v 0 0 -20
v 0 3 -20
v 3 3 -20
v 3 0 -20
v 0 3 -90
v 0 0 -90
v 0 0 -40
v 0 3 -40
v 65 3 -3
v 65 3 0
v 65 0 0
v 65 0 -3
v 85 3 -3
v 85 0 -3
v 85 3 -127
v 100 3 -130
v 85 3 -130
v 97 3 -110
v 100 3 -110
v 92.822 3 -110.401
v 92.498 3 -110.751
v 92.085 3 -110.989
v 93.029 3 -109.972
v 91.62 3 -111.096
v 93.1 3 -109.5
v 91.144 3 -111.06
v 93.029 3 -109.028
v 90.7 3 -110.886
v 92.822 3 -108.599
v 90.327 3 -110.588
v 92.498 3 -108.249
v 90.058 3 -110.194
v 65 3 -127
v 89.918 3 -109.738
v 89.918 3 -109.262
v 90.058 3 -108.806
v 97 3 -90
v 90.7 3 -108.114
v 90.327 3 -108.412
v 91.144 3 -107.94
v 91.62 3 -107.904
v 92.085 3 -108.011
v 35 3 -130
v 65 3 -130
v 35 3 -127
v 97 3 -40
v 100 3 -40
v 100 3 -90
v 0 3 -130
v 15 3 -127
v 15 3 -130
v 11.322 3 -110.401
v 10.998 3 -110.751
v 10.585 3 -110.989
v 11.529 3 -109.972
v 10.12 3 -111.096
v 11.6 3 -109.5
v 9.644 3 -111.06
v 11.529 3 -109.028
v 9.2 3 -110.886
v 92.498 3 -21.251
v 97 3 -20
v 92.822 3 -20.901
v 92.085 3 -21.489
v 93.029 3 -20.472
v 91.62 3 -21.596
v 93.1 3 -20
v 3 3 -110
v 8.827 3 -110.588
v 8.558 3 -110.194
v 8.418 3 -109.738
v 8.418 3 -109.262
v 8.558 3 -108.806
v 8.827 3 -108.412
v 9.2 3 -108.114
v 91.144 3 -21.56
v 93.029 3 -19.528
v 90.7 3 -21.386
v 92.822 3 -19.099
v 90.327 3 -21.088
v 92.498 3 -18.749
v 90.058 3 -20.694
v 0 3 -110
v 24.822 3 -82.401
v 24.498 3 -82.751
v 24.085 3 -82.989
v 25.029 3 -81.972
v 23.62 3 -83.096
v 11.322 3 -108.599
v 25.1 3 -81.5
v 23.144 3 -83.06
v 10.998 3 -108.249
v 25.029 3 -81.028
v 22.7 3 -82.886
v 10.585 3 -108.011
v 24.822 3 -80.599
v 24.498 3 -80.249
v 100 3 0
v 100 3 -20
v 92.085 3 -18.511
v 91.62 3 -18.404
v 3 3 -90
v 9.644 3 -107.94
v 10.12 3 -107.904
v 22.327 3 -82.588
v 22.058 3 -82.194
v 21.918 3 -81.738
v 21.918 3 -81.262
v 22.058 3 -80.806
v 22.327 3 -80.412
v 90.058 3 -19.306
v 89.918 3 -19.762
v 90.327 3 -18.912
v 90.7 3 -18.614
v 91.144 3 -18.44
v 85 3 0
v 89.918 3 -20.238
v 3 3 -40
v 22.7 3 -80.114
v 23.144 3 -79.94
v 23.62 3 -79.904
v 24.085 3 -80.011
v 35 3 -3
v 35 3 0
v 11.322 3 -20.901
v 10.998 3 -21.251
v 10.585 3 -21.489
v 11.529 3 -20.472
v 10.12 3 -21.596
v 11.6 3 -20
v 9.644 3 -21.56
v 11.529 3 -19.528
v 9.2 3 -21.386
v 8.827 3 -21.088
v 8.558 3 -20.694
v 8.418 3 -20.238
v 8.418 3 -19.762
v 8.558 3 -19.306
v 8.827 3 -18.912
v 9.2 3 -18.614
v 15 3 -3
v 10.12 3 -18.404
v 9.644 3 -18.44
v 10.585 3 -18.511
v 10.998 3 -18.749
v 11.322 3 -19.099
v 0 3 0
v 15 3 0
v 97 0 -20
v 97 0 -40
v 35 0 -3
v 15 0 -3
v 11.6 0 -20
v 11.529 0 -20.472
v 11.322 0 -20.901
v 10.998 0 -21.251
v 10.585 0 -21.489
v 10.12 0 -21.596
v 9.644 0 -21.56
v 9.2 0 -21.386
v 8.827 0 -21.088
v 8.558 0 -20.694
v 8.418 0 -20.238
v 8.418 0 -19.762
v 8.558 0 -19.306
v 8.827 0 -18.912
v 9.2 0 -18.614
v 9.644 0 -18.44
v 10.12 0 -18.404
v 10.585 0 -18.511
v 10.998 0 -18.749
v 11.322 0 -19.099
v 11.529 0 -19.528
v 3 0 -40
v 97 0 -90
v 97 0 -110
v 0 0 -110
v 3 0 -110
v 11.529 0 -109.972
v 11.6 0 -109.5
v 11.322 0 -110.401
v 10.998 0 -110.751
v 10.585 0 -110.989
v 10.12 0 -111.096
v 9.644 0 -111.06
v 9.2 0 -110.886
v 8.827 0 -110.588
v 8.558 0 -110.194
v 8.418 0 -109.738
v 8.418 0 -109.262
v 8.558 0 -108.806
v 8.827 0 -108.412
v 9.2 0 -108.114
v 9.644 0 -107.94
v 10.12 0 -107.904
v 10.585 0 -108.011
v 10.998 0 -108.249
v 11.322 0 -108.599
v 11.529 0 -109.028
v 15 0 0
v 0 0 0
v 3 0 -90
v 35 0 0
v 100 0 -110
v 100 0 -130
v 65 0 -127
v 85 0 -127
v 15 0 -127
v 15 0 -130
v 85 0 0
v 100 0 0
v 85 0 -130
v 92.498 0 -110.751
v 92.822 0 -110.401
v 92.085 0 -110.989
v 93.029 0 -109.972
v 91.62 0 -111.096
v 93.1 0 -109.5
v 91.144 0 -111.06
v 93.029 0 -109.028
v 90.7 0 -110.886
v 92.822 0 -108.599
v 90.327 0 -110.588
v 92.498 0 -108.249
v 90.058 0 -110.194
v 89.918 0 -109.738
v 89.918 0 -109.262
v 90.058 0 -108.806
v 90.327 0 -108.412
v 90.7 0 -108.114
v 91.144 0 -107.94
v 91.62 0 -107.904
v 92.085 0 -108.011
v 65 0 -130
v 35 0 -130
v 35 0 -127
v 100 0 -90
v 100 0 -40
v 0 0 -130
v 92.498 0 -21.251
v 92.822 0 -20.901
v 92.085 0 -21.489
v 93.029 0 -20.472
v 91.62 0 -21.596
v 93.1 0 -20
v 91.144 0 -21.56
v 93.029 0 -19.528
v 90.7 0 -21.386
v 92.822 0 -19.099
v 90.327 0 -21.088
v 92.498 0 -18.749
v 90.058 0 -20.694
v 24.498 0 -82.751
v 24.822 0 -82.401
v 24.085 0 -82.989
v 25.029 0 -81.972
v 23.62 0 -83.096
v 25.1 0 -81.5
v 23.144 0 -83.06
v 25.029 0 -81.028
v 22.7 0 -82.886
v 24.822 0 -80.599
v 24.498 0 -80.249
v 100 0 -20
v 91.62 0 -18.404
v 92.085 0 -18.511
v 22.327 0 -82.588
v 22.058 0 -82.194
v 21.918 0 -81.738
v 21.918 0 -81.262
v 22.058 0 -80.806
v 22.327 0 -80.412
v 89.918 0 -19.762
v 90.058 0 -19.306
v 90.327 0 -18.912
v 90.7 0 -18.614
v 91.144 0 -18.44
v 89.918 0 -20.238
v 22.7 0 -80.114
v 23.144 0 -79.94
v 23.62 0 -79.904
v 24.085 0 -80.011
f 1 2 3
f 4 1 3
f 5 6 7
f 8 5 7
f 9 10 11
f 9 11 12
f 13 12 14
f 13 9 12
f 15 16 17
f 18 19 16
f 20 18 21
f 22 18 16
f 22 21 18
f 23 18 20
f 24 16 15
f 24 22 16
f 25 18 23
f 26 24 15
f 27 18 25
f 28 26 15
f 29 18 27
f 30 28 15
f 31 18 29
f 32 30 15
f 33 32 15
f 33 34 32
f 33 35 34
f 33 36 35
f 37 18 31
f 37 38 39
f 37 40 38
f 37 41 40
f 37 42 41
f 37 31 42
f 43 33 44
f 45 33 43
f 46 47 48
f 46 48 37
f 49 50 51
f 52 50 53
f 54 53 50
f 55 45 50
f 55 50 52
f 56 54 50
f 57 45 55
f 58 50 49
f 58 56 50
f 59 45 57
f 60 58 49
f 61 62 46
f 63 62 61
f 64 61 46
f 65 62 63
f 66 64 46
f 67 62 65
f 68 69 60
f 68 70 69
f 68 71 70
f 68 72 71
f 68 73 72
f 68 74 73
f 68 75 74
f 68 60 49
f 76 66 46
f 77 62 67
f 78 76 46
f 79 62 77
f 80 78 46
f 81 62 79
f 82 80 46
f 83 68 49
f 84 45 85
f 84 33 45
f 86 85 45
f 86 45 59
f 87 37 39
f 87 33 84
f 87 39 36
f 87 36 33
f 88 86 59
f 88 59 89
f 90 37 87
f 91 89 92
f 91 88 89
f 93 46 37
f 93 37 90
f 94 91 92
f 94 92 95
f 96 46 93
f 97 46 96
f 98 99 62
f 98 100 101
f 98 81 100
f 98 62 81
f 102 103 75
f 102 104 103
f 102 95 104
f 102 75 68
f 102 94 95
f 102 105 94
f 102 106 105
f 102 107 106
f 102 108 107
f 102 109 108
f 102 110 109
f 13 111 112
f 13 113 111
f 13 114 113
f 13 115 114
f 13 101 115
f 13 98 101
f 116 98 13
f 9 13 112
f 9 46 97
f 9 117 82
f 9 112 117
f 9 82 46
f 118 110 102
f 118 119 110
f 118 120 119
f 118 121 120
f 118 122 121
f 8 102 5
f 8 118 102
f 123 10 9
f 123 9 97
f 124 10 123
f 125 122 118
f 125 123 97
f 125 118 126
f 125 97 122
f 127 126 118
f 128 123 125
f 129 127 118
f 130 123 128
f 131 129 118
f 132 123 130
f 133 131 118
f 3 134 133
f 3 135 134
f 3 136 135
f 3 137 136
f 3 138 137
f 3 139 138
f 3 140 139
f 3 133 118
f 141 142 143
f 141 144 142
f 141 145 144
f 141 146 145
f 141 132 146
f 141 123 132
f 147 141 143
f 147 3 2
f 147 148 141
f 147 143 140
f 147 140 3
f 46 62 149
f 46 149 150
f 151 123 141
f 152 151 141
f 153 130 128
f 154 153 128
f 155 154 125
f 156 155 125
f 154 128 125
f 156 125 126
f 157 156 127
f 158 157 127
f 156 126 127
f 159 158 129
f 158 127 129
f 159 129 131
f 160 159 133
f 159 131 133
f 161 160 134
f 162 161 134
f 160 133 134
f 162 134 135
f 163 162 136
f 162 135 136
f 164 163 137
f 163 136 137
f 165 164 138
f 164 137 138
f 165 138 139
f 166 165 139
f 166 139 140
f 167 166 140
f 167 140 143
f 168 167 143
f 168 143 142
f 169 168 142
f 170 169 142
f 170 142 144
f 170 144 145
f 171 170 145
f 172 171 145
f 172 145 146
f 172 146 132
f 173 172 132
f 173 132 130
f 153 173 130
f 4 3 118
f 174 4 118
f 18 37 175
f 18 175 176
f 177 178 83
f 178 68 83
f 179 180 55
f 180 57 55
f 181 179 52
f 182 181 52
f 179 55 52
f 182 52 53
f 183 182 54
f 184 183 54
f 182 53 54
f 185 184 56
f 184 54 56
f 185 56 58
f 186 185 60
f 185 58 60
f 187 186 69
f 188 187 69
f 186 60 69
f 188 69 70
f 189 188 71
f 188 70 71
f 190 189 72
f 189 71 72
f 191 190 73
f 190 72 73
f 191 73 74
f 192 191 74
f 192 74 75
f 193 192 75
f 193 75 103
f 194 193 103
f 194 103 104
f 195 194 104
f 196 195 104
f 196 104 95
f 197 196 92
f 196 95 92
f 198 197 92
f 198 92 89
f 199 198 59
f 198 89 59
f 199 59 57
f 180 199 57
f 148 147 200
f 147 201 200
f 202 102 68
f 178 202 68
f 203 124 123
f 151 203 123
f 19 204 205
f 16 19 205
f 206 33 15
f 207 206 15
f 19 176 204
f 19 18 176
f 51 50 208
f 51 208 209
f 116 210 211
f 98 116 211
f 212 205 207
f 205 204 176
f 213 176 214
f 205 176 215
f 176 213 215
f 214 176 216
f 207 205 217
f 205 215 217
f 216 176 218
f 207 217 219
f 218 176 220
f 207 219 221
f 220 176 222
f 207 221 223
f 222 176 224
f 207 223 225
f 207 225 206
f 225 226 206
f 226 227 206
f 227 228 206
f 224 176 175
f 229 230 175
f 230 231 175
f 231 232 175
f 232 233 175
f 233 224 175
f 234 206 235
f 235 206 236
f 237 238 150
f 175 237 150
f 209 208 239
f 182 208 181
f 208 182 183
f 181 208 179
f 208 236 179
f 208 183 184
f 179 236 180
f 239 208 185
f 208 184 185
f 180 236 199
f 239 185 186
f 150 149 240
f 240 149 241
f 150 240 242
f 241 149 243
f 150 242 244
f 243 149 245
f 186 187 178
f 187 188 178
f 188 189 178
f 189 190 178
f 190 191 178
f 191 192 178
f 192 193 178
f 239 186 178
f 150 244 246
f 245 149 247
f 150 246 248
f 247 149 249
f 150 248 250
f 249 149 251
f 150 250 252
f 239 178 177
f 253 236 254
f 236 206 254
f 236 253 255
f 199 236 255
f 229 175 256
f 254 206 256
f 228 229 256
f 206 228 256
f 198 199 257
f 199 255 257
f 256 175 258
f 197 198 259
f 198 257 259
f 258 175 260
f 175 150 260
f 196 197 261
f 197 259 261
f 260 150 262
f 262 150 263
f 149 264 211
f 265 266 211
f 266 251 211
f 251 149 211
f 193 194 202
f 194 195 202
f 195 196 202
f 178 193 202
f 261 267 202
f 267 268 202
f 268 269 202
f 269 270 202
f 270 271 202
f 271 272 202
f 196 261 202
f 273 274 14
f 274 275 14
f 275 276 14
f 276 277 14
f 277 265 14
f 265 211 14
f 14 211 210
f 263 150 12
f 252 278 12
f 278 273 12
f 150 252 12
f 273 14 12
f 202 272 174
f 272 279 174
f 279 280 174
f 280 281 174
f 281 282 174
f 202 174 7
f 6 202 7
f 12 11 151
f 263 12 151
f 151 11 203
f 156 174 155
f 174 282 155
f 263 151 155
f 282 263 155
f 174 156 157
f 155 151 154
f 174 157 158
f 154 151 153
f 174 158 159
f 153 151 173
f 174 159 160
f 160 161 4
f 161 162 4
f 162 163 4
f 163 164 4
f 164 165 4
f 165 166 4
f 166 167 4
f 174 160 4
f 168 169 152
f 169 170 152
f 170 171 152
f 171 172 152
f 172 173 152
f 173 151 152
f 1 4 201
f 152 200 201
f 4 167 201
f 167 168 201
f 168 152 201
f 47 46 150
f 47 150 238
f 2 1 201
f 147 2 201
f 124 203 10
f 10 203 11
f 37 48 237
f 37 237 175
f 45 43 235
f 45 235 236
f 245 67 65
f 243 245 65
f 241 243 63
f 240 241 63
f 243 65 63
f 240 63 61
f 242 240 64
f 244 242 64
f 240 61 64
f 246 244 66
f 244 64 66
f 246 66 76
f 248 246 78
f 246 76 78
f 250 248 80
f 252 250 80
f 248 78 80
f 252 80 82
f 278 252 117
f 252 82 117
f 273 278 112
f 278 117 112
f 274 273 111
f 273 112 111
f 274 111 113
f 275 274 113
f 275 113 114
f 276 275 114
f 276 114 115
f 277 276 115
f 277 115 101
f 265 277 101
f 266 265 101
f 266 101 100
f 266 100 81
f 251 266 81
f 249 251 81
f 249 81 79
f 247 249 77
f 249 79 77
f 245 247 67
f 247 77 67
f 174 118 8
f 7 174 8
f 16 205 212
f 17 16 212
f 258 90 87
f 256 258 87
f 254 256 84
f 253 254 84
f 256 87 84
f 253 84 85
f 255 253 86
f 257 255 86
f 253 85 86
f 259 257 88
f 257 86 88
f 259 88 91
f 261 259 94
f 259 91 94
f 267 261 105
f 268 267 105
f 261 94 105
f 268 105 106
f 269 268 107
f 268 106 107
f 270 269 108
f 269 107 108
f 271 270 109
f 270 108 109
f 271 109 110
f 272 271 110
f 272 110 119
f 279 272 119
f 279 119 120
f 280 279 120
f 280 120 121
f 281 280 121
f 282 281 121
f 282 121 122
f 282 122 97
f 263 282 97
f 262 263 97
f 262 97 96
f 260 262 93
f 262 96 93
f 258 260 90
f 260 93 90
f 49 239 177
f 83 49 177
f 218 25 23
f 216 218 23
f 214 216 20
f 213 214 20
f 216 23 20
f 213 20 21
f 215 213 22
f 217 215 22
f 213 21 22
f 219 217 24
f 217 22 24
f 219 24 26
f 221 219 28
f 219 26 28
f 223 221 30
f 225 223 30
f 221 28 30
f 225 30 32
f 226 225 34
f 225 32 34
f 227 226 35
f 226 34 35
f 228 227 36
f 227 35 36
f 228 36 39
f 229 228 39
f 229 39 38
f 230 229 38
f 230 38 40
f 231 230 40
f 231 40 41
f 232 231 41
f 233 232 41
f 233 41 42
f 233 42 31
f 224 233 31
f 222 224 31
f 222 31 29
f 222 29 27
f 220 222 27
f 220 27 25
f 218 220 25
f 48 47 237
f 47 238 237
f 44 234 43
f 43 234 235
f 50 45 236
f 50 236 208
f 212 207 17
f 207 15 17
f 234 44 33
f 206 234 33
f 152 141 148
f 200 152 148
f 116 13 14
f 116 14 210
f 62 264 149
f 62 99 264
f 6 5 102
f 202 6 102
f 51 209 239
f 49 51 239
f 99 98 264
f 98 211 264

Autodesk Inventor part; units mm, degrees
ref_plane "YZ Plane" through (0, 0, 0) normal (1, 0, 0) x (0, 1, 0)
ref_plane "XZ Plane" through (0, 0, 0) normal (0, 1, 0) x (-1, 0, 0)
ref_plane "XY Plane" through (0, 0, 0) normal (0, 0, 1) x (1, 0, 0)
sketch "Sketch1" plane through (0, 0, 0) normal (0, 1, 0) x (-1, 0, 0)
  line L0 (0, 0) -> (-100, 0)
  line L1 (-100, 0) -> (-100, -130)
  line L2 (-100, -130) -> (0, -130)
  line L3 (0, -130) -> (0, 0)
  dimension "Length" = 130
  dimension "Width" = 100
extrude "Baseplate" add sketch "Sketch1" along normal blind 3
sketch "TabsSketch" plane through (0, 3, 0) normal (0, 1, 0) x (1, 0, 0)
  line L0 (0, 130) -> (0, 0) projected
  line L1 (0, 20) -> (3, 20)
  line L2 (3, 20) -> (3, 40)
  line L3 (3, 40) -> (0, 40)
  line L4 (0, 40) -> (0, 20)
  line L5 (0, 90) -> (3, 90)
  line L6 (3, 90) -> (3, 110)
  line L7 (3, 110) -> (0, 110)
  line L8 (0, 110) -> (0, 90)
  line L9 (0, 0) -> (100, 0) projected
  line L10 (100, 130) -> (0, 130) projected
  line L11 (50, 0) -> (50, 130) construction
  line L12 (15, 0) -> (35, 0)
  line L13 (35, 0) -> (35, 3)
  line L14 (35, 3) -> (15, 3)
  line L15 (15, 3) -> (15, 0)
  line L16 (15, 130) -> (35, 130)
  line L17 (35, 130) -> (35, 127)
  line L18 (35, 127) -> (15, 127)
  line L19 (15, 127) -> (15, 130)
  line L20 (100, 130) -> (100, 0)
  line L21 (100, 20) -> (97, 20)
  line L22 (97, 20) -> (97, 40)
  line L23 (97, 40) -> (100, 40)
  line L24 (100, 40) -> (100, 20)
  line L25 (100, 90) -> (97, 90)
  line L26 (97, 90) -> (97, 110)
  line L27 (97, 110) -> (100, 110)
  line L28 (100, 110) -> (100, 90)
  line L29 (100, 0) -> (0, 0)
  line L30 (0, 130) -> (100, 130)
  line L31 (85, 0) -> (65, 0)
  line L32 (65, 0) -> (65, 3)
  line L33 (65, 3) -> (85, 3)
  line L34 (85, 3) -> (85, 0)
  line L35 (85, 130) -> (65, 130)
  line L36 (65, 130) -> (65, 127)
  line L37 (65, 127) -> (85, 127)
  line L38 (85, 127) -> (85, 130)
  point P0 (35, 0)
  point P1 (65, 0)
  point P2 (85, 0)
  point P3 (100, 110)
  point P4 (85, 130)
  point P5 (0, 110)
  point P6 (0, 40)
  dimension "d4" = 3
  dimension "LengthTabOffset" = 20
  dimension "d7" = 20
  dimension "d8" = 20
  dimension "BaseTabWidth" = 20
  dimension "d10" = 50
  dimension "d11" = 3
  dimension "d12" = 3
  dimension "d13" = 20
  dimension "d14" = 20
  dimension "WidthTabOffset" = 15
  dimension "d16" = 30
extrude "Extrusion2" cut sketch "TabsSketch" against normal through all contours L7 L6 L5 L0 | L10 L17 L18 L19 | L3 L2 L1 L0 | L10 L38 L37 L36 | L15 L14 L13 L9 | L20 L25 L26 L27 | L32 L33 L34 L9 | L20 L21 L22 L23
sketch "Sketch3" plane through (0, 3, 0) normal (0, 1, 0) x (1, 0, 0)
  circle A0 centre (10, 20) radius 1.6
  circle A1 centre (10, 109.5) radius 1.6
  circle A2 centre (91.5, 20) radius 1.6
  circle A3 centre (91.5, 109.5) radius 1.6
  line L0 (0, 20) -> (0, 0) projected
  line L1 (0, 90) -> (0, 40) projected
  line L2 (0, 0) -> (15, 0) projected
  line L3 (35, 0) -> (65, 0) projected
  circle A4 centre (23.5, 81.5) radius 1.6
  dimension "ScrewDiameter" = 3.2
  dimension "d20" = 3.2
  dimension "d21" = 3.2
  dimension "d22" = 3.2
  dimension "d23" = 89.5
  dimension "d24" = 81.5
  dimension "d25" = 89.5
  dimension "d26" = 81.5
  dimension "d27" = 10
  dimension "d28" = 10
  dimension "d29" = 20
  dimension "d30" = 20
  dimension "d31" = 61.5
  dimension "d32" = 68
  dimension "d33" = 3.2
extrude "PCB Mounting" cut sketch "Sketch3" against normal through all
equation "\"d4\" = Thickness"
equation "\"d7\" = LengthTabOffset"
equation "\"d8\" = BaseTabWidth"
equation "\"d11\" = Thickness"
equation "\"d12\" = Thickness"
equation "\"d13\" = BaseTabWidth"
equation "\"d14\" = BaseTabWidth"
equation "\"d20\" = ScrewDiameter"
equation "\"d21\" = ScrewDiameter"
equation "\"d22\" = d20"
equation "\"d25\" = d23"
equation "\"d26\" = d24"
equation "\"d28\" = d27"
equation "\"d30\" = d29"
equation "\"d33\" = ScrewDiameter"
equation "\"Thickness\" = 3"
properties part number "Base"
